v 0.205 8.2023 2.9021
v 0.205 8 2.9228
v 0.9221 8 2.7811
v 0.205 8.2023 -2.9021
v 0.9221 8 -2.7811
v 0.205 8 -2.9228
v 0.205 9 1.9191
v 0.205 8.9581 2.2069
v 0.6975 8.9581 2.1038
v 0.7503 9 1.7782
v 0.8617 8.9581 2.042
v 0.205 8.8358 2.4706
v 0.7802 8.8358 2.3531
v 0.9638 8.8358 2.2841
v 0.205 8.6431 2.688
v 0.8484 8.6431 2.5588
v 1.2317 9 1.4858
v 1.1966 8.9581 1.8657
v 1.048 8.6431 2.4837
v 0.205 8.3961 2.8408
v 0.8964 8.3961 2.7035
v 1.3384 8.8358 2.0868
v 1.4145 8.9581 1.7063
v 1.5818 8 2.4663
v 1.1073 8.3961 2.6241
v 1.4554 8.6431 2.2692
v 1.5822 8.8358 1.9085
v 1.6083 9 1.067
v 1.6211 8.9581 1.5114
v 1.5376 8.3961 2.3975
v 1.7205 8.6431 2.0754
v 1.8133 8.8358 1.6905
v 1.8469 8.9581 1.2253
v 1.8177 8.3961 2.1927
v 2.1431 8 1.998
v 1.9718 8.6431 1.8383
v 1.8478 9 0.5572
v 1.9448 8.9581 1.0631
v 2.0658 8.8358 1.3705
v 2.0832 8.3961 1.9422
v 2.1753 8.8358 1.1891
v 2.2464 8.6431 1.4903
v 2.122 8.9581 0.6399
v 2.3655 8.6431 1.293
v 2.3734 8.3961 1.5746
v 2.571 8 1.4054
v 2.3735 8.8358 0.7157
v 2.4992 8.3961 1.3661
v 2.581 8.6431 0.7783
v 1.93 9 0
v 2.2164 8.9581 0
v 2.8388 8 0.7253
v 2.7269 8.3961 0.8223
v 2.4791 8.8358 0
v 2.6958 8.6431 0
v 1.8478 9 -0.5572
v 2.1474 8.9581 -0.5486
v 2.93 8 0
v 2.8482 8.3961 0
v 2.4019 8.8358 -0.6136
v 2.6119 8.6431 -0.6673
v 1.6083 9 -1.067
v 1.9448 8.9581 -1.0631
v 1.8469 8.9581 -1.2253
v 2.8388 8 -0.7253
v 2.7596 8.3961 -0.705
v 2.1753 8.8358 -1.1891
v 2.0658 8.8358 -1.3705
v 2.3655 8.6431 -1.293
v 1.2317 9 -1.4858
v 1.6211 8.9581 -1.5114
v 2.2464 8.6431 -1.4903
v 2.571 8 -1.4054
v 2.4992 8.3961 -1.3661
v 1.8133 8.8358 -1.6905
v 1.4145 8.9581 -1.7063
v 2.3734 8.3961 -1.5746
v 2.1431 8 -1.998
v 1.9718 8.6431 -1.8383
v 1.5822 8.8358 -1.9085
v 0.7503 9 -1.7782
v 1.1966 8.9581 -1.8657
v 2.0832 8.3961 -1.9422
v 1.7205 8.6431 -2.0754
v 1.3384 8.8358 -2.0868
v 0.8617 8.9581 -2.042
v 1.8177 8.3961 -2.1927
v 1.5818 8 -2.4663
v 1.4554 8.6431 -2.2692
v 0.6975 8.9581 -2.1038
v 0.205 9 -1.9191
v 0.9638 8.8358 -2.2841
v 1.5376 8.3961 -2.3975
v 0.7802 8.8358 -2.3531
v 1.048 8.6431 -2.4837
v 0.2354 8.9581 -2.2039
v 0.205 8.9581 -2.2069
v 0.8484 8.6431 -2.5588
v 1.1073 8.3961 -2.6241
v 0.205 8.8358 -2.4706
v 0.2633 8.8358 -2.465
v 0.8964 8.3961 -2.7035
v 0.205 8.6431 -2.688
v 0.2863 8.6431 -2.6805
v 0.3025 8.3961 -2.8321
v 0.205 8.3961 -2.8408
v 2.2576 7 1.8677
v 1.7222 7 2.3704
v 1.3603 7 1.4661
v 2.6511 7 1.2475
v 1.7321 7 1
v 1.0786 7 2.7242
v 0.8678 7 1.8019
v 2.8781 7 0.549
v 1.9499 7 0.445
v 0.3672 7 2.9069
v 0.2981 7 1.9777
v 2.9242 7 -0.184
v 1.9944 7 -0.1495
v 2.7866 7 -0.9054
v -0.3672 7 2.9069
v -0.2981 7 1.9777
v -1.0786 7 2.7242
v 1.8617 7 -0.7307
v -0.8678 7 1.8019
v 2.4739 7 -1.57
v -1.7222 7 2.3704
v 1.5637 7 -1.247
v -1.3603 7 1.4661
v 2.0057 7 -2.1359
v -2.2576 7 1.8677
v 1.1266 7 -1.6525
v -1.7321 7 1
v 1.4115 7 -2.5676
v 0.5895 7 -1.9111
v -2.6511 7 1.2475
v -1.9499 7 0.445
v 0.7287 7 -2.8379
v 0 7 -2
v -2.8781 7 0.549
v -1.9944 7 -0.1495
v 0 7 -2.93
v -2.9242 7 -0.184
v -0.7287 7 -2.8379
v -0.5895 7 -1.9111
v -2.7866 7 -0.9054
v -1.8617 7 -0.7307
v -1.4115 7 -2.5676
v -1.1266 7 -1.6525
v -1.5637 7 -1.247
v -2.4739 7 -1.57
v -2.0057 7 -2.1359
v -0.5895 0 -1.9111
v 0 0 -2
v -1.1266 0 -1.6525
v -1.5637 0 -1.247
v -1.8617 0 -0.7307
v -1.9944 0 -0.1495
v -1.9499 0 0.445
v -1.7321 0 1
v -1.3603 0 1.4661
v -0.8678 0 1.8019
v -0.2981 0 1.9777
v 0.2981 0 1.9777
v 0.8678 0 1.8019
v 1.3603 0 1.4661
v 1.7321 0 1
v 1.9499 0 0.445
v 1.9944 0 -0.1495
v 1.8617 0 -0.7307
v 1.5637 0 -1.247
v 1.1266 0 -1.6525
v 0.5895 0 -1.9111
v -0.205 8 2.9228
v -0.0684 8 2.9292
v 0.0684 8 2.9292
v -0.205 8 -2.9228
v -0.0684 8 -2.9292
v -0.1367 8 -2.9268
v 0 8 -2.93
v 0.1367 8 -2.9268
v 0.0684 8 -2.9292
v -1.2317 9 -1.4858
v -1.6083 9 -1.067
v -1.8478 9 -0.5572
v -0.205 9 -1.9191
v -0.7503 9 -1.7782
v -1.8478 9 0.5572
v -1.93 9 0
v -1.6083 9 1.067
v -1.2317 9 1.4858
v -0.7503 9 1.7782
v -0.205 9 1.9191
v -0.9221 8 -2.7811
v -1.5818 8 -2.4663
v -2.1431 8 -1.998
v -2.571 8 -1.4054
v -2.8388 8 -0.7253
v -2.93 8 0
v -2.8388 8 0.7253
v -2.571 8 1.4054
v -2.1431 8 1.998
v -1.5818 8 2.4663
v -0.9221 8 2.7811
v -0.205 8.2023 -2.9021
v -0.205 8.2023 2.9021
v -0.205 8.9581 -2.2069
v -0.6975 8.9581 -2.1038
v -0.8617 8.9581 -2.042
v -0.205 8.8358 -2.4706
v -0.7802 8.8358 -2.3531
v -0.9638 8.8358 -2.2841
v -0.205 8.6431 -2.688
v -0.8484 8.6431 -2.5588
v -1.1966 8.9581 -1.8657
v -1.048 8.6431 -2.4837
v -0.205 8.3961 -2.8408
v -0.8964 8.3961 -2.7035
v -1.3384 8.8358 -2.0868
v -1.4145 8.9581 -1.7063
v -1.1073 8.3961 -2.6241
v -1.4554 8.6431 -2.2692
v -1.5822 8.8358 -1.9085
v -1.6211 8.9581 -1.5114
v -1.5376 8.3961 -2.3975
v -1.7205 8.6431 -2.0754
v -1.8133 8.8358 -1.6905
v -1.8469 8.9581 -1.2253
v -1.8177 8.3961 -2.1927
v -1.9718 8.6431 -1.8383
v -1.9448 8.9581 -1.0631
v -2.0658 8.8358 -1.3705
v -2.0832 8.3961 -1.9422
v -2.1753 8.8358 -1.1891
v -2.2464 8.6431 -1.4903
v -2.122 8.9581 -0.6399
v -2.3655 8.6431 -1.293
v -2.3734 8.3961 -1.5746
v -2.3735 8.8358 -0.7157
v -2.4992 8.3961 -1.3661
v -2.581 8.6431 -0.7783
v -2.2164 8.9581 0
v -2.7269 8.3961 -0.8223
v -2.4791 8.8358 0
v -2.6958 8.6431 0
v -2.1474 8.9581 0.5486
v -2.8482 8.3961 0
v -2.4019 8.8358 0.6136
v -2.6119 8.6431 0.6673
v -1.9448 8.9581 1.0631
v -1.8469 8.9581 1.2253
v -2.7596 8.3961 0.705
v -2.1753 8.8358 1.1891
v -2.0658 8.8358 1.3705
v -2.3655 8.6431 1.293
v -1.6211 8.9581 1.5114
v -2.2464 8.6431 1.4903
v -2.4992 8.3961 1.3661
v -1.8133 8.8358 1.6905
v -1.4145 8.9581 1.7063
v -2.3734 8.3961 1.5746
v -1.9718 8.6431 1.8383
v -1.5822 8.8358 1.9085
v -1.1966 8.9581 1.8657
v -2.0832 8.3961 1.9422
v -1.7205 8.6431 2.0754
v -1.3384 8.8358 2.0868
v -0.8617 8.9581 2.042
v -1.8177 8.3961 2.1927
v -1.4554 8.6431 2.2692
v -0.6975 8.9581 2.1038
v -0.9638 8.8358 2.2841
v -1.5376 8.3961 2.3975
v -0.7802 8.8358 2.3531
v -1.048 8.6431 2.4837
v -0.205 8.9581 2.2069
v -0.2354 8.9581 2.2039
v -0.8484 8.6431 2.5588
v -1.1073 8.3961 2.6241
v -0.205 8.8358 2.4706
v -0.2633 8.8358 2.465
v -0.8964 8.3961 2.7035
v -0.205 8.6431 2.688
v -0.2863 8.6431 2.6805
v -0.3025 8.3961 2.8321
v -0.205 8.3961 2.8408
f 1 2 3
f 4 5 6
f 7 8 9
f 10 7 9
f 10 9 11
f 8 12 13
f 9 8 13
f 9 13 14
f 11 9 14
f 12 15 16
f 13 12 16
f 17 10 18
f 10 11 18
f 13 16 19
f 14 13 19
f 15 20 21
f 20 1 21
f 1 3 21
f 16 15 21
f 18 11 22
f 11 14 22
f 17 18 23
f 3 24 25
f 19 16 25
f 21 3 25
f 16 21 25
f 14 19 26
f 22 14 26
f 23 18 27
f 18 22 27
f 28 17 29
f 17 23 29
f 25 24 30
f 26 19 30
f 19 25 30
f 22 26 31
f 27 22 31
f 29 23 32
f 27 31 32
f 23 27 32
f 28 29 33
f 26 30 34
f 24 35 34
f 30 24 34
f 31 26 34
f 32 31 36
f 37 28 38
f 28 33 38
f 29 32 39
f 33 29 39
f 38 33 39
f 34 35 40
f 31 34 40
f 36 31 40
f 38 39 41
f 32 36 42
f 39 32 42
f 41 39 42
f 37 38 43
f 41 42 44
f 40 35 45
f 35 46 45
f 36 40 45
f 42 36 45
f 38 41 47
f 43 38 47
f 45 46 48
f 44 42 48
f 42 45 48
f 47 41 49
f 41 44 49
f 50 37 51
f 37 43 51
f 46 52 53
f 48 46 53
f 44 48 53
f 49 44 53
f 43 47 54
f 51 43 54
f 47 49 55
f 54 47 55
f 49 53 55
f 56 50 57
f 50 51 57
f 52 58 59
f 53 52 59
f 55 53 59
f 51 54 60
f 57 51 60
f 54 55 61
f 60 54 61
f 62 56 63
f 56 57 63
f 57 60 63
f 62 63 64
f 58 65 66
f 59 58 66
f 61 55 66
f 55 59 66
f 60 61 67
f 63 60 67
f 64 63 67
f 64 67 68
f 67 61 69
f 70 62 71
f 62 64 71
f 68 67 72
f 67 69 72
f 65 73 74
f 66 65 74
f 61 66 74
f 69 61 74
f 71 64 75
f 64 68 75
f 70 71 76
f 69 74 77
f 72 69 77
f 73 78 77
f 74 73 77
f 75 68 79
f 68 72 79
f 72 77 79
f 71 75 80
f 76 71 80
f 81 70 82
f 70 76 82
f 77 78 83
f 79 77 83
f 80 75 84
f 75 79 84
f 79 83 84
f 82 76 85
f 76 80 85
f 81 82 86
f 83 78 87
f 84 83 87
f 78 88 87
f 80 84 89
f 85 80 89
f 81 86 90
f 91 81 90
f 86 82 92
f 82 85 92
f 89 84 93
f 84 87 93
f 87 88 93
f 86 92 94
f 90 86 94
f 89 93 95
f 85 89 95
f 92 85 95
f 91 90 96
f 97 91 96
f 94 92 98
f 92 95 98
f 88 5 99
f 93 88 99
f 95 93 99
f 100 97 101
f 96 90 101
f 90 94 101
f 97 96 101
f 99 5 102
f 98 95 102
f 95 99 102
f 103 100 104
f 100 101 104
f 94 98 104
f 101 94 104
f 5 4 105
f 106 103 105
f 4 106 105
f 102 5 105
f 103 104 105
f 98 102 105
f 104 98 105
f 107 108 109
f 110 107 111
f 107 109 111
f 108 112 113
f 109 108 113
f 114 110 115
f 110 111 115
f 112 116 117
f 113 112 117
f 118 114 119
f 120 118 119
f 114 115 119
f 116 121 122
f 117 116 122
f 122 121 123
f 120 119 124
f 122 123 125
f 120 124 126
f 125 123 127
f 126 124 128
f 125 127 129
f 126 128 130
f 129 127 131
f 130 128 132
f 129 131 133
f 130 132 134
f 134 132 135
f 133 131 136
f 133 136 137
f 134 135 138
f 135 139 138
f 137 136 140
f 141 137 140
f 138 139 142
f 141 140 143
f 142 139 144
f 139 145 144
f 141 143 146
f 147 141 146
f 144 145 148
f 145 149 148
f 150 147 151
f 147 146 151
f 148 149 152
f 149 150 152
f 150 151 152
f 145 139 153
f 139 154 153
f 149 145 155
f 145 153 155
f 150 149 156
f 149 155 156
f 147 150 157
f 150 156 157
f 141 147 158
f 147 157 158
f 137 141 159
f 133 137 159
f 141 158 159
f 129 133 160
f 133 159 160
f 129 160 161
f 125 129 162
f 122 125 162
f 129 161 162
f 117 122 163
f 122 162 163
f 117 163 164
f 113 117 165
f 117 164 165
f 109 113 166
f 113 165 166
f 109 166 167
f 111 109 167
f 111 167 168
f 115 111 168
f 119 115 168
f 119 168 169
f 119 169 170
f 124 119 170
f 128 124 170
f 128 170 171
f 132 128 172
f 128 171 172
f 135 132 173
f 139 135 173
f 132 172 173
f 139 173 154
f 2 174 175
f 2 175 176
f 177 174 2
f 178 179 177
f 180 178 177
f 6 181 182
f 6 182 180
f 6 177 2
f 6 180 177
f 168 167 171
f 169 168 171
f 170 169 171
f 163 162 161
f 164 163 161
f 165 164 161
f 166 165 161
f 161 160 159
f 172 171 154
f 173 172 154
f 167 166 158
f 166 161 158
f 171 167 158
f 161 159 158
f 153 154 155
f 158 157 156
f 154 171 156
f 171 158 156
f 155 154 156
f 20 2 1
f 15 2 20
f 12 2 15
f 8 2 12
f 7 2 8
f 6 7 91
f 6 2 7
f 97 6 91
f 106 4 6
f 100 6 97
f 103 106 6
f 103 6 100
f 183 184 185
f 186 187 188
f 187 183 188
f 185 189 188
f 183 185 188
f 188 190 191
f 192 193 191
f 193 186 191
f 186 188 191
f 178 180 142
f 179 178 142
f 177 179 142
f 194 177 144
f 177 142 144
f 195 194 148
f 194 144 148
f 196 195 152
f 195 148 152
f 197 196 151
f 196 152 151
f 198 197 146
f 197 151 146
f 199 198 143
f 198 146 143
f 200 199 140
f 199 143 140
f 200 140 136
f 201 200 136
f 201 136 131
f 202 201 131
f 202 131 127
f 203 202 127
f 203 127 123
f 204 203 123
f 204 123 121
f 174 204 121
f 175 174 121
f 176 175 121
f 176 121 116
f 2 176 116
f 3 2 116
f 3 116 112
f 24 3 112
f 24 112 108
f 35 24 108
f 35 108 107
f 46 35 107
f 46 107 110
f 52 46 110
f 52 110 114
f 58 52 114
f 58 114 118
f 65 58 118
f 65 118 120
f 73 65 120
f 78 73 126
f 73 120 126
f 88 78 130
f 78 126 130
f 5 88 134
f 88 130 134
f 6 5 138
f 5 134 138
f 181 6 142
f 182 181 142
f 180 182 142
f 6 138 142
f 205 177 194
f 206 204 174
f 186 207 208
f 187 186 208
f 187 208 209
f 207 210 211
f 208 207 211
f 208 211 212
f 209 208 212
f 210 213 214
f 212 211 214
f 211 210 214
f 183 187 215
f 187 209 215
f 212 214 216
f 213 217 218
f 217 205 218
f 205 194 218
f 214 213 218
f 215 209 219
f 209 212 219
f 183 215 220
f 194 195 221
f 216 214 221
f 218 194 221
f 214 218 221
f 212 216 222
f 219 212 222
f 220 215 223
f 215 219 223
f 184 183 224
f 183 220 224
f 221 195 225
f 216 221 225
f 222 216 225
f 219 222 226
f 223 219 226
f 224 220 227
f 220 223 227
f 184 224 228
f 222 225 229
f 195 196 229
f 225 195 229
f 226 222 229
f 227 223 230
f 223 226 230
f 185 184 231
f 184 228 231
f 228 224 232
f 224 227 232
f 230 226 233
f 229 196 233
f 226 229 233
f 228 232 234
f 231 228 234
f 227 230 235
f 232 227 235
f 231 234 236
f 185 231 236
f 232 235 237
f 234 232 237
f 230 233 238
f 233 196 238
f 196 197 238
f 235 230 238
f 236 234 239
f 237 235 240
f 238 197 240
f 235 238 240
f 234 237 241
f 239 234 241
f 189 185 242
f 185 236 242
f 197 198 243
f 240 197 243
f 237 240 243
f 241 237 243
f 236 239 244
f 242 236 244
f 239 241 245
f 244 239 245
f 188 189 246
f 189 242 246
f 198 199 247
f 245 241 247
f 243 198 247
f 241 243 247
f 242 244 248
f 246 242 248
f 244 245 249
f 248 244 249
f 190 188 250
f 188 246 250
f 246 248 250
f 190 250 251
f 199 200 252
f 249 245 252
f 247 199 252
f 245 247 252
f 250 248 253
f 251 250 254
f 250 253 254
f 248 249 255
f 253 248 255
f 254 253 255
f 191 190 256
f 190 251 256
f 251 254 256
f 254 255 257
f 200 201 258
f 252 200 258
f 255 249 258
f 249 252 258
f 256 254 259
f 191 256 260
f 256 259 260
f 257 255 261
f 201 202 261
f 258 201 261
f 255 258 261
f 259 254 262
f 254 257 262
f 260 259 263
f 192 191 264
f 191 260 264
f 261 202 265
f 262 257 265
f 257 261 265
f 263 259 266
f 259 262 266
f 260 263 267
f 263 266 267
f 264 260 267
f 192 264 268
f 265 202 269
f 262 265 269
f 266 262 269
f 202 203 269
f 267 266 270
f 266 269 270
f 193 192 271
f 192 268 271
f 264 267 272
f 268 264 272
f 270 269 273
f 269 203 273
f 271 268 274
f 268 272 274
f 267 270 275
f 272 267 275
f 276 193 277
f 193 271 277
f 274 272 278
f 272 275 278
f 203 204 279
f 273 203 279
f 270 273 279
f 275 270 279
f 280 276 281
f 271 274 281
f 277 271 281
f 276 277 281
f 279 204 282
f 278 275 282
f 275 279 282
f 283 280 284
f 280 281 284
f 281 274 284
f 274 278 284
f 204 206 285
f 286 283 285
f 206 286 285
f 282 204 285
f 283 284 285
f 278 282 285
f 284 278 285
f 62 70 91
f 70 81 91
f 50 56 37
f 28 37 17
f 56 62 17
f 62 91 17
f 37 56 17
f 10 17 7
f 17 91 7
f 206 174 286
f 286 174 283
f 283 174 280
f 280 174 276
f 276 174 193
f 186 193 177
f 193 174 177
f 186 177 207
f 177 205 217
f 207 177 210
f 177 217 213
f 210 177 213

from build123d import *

# Parameters (mm, degrees)
CUT_EXTRUDE1_REACH             = 11.908
SKETCH2_W                      = 0.41
SKETCH2_H                      = 1
CUT_EXTRUDE1_DIRECTION_2_REACH = 11.908


with BuildPart() as part:
    # Sketch1 → Revolve1 (revolve)
    with BuildSketch(Plane.XY, mode=Mode.PRIVATE) as revolve1_sk:
        with BuildLine():
            Line((0, 9), (1.93, 9))
            ThreePointArc((1.93, 9), (2.637106781, 8.707106781), (2.93, 8))
            Line((2.93, 8), (2.93, 7))
            Line((2.93, 7), (2, 7))
            Line((2, 7), (2, 0))
            Line((2, 0), (0, 0))
            Line((0, 0), (0, 9))
        make_face()
    revolve(revolve1_sk.sketch.rotate(Axis((0, 0, 0), (0, 1, 0)), 90), axis=Axis((0, 0, 0), (0, 1, 0)))

    # Sketch2 → Cut-Extrude1 (cut, up to next)
    with BuildSketch(Plane.XY, mode=Mode.PRIVATE) as cut_extrude1_sk1:
        with Locations((0, 8.5)):
            Rectangle(SKETCH2_W, SKETCH2_H)
    cut_extrude1_tool1 = extrude(cut_extrude1_sk1.sketch, amount=-CUT_EXTRUDE1_REACH, mode=Mode.PRIVATE) & part.part
    add(cut_extrude1_tool1.solids().sort_by_distance((0, 8.5, 0))[0], mode=Mode.SUBTRACT)

    # Sketch2 → Cut-Extrude1 direction 2 (cut, up to next)
    with BuildSketch(Plane.XY, mode=Mode.PRIVATE) as cut_extrude1_direction_2_sk1:
        with Locations((0, 8.5)):
            Rectangle(SKETCH2_W, SKETCH2_H)
    cut_extrude1_direction_2_tool1 = extrude(cut_extrude1_direction_2_sk1.sketch, amount=CUT_EXTRUDE1_DIRECTION_2_REACH, mode=Mode.PRIVATE) & part.part
    add(cut_extrude1_direction_2_tool1.solids().sort_by_distance((0, 8.5, 0))[0], mode=Mode.SUBTRACT)


solid = part.part
